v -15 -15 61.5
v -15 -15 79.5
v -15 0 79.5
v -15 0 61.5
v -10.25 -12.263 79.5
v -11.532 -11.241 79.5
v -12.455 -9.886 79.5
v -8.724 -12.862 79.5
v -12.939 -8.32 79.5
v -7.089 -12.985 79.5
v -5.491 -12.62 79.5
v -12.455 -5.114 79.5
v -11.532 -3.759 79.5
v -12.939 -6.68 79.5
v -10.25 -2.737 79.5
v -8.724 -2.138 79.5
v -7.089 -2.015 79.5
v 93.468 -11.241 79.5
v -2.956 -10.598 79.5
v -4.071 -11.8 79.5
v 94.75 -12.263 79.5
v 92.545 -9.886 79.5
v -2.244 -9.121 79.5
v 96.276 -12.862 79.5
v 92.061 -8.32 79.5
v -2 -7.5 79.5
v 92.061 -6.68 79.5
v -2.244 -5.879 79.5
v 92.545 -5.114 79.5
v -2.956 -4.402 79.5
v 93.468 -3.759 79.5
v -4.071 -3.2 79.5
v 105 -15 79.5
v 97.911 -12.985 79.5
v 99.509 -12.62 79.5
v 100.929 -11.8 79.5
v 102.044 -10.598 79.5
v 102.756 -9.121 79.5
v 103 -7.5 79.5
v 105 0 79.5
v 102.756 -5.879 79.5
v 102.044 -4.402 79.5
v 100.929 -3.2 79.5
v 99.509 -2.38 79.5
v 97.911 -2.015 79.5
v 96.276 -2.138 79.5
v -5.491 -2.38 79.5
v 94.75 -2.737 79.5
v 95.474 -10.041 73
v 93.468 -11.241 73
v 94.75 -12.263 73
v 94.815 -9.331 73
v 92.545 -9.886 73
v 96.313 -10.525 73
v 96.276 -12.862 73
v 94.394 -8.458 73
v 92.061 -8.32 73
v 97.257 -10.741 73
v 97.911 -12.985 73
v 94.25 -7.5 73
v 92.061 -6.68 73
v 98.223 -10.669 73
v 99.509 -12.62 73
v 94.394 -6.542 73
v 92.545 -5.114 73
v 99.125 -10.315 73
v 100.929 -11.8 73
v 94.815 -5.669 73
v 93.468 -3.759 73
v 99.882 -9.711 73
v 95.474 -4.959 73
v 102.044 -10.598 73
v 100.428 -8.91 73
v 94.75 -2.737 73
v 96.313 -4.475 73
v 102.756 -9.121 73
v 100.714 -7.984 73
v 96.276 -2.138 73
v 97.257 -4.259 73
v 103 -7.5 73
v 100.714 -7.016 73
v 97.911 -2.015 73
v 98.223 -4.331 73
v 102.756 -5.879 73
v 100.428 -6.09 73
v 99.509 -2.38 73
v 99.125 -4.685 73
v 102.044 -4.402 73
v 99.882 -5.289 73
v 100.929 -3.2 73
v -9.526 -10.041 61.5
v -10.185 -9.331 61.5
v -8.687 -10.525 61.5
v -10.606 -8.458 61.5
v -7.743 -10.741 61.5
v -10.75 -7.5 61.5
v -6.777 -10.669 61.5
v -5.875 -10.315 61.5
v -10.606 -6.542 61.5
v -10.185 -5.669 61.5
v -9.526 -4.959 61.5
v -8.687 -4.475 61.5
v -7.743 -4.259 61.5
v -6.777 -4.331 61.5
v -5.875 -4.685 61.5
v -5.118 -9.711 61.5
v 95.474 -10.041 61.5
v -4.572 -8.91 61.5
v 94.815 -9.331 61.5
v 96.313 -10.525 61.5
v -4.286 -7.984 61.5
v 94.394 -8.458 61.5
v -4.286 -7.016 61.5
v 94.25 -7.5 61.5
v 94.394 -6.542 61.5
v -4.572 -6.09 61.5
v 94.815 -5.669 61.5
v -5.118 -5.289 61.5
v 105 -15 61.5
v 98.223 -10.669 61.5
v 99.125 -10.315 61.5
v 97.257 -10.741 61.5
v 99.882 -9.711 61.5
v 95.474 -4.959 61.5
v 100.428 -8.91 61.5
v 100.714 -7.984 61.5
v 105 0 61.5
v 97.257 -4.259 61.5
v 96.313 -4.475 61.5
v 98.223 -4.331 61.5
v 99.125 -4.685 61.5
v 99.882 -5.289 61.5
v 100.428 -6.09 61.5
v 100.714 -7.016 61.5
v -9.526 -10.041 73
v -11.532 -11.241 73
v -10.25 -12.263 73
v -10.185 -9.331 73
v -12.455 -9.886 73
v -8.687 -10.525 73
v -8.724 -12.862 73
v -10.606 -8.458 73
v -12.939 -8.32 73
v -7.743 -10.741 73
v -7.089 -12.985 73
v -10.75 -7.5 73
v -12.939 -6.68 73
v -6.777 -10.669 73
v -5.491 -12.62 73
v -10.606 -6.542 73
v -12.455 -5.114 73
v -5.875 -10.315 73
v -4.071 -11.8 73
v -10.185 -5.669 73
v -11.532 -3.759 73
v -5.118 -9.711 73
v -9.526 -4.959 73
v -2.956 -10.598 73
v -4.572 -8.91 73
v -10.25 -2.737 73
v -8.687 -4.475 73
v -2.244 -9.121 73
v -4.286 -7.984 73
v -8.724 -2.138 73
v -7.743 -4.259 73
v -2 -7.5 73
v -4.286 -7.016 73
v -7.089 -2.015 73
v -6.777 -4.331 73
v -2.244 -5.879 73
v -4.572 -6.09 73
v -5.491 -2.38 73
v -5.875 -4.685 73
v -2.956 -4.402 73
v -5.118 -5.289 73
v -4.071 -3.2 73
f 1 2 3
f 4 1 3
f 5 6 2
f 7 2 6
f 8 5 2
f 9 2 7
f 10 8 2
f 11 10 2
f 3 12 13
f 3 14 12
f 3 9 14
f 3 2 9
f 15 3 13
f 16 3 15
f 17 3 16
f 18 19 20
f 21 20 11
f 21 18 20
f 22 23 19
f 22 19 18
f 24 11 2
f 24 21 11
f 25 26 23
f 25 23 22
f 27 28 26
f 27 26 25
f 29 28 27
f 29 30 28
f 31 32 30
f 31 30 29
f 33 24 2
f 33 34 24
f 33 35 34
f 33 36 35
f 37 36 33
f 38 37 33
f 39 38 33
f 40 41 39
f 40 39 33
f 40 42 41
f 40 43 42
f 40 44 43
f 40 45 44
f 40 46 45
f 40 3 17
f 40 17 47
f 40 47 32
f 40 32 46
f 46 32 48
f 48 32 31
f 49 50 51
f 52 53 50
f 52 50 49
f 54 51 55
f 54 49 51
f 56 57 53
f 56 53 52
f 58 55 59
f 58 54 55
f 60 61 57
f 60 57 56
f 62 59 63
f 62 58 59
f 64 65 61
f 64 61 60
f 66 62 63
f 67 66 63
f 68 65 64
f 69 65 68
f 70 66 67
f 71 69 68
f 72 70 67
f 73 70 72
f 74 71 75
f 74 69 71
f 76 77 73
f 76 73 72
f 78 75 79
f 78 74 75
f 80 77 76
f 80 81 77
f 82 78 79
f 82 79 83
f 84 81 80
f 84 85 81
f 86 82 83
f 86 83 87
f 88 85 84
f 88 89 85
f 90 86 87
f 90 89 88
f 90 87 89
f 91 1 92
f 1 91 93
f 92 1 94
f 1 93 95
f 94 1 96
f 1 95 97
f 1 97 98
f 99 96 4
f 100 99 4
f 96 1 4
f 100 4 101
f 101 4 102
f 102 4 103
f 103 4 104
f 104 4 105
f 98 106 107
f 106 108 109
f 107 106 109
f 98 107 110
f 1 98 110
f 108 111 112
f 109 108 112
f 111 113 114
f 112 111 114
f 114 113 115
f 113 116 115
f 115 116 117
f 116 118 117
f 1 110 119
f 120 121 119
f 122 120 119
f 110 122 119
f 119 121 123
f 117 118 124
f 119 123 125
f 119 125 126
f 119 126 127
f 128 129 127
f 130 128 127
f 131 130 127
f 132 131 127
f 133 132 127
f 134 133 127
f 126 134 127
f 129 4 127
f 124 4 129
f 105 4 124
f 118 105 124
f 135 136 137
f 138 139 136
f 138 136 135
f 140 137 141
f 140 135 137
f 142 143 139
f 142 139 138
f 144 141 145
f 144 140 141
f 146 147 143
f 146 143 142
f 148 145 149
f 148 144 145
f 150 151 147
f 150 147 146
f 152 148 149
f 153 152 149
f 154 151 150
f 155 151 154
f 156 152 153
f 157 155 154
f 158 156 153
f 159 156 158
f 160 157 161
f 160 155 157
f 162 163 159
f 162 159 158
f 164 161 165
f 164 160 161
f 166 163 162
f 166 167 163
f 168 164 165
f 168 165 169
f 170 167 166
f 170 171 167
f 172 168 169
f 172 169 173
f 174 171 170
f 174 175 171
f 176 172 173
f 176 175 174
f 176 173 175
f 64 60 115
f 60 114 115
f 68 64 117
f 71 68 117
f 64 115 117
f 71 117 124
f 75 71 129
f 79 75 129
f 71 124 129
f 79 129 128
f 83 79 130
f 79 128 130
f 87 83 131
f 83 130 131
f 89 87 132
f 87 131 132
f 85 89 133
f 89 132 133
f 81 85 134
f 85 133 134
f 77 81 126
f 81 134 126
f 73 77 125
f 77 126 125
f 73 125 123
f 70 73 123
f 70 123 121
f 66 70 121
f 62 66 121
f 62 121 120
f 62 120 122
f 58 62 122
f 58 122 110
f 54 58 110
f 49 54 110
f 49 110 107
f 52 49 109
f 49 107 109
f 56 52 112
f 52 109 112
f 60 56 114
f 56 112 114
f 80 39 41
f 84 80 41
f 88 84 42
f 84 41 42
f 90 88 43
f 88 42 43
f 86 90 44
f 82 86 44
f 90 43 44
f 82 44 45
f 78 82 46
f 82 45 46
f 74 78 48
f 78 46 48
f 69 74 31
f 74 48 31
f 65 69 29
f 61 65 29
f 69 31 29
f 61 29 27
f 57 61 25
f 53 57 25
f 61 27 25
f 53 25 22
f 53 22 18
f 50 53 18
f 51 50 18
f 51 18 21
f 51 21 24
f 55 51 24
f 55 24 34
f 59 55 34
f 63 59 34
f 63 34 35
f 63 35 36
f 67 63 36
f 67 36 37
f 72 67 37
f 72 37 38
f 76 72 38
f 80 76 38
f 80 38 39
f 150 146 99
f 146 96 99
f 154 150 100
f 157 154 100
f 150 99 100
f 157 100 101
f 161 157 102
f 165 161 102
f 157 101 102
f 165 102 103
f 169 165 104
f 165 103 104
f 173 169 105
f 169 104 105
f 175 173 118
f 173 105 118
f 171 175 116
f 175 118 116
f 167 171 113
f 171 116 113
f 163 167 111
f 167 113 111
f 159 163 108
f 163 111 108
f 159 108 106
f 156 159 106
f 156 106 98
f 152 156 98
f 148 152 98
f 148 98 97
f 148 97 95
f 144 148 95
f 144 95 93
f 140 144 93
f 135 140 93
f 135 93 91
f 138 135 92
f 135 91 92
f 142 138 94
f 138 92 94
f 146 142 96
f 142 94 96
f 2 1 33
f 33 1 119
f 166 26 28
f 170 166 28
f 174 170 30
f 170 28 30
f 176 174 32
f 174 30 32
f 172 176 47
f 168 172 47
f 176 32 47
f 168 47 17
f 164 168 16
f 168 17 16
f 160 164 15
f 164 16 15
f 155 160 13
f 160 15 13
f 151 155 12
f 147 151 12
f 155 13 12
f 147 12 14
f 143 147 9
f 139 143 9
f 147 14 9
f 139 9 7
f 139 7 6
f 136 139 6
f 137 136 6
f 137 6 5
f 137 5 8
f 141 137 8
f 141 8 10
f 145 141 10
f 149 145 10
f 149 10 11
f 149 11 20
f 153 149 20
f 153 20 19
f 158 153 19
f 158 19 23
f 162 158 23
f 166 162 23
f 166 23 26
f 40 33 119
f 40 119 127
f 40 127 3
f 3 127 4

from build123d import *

# Parameters (mm, degrees)
F1_DEPTH         = 15
F2_W             = 74
F2_H             = 5
F3_DEPTH         = 15
F4_R             = 4.99999
F5_R             = 8
F8_D             = 7
F11_D            = 5
F11_DEPTH        = 20
F11_TIP          = 1.5021515476
F11_ON_F10_D     = 5
F11_ON_F10_DEPTH = 20
F11_ON_F10_TIP   = 1.5021515476
F12_W            = 105
F12_H            = 15
F12_W_2          = 15
F12_R            = 2.5
F13_DEPTH        = 18
F16_D            = 6.5
F16_CBORE_D      = 11
F16_CBORE_DEPTH  = 6.5


# Not quite as in the source:
# - a fillet or chamfer is up to 0.001 mm smaller than in the source, because OpenCascade refuses the exact size
# - a feature of the source that left no trace in its solid (it failed there, or was rolled back) is left out


with BuildPart() as f1:
    # F0 (on Front) → F1 (new body)
    with BuildSketch(Plane.XZ):
        Polygon((90, 0), (0, 0), (0, 61.5), (-15, 61.5), (-15, -15), (105, -15), (105, 61.5), (90, 61.5), align=None)
    extrude(amount=F1_DEPTH)

    # F2 (on face) → F3 (join, through all)
    with BuildSketch(Plane.XZ.offset(15)):
        with Locations((45, -17.5)):
            Rectangle(F2_W, F2_H)
    extrude(amount=-F3_DEPTH)

    # F4 (radius 5 in the source; OpenCascade refuses exactly that, so slightly less here)
    f4_edges = [f1.edges().sort_by_distance(p)[0] for p in [
        (0, -7.5, 0),
        (90, -7.5, 0),
        (8, -7.5, -15),
        (82, -7.5, -15),
    ]]
    fillet(f4_edges, radius=F4_R)

    # F5
    f5_edges = [f1.edges().sort_by_distance(p)[0] for p in [
        (-15, -7.5, -15),
        (105, -7.5, -15),
    ]]
    fillet(f5_edges, radius=F5_R)

    # F8 (through all)
    with Locations(Plane.XZ.offset(15)):
        with Locations((19.6, -10), (70.4, -10)):
            Hole(F8_D / 2)

    # F11
    with Locations(Plane.XY.offset(61.5)):
        with Locations((-7.5, -7.5)):
            Hole(F11_D / 2, depth=F11_DEPTH)
            with Locations((0, 0, -(F11_DEPTH + F11_TIP / 2))):  # 118° drill point
                Cone(0, F11_D / 2, F11_TIP, mode=Mode.SUBTRACT)

    # F11 on F10
    with Locations(Plane.XY.offset(61.5)):
        with Locations((97.5, -7.5)):
            Hole(F11_ON_F10_D / 2, depth=F11_ON_F10_DEPTH)
            with Locations((0, 0, -(F11_ON_F10_DEPTH + F11_ON_F10_TIP / 2))):  # 118° drill point
                Cone(0, F11_ON_F10_D / 2, F11_ON_F10_TIP, mode=Mode.SUBTRACT)


with BuildPart() as f13:
    # F12 (on face) → F13 (new body)
    with BuildSketch(Plane.XY.offset(61.5)):
        with Locations((52.5, -7.5)):
            Rectangle(F12_W, F12_H)
        with Locations((-7.5, -7.5)):
            Rectangle(F12_W_2, F12_H)
        with Locations((-7.5, -7.5)):
            Circle(F12_R, mode=Mode.SUBTRACT)
    extrude(amount=F13_DEPTH)

    # F16 (through all)
    with Locations(Plane.XY.offset(79.5)):
        with Locations((-7.5, -7.5), (97.5, -7.5)):
            CounterBoreHole(F16_D / 2, F16_CBORE_D / 2, F16_CBORE_DEPTH)


solid = f13.part
